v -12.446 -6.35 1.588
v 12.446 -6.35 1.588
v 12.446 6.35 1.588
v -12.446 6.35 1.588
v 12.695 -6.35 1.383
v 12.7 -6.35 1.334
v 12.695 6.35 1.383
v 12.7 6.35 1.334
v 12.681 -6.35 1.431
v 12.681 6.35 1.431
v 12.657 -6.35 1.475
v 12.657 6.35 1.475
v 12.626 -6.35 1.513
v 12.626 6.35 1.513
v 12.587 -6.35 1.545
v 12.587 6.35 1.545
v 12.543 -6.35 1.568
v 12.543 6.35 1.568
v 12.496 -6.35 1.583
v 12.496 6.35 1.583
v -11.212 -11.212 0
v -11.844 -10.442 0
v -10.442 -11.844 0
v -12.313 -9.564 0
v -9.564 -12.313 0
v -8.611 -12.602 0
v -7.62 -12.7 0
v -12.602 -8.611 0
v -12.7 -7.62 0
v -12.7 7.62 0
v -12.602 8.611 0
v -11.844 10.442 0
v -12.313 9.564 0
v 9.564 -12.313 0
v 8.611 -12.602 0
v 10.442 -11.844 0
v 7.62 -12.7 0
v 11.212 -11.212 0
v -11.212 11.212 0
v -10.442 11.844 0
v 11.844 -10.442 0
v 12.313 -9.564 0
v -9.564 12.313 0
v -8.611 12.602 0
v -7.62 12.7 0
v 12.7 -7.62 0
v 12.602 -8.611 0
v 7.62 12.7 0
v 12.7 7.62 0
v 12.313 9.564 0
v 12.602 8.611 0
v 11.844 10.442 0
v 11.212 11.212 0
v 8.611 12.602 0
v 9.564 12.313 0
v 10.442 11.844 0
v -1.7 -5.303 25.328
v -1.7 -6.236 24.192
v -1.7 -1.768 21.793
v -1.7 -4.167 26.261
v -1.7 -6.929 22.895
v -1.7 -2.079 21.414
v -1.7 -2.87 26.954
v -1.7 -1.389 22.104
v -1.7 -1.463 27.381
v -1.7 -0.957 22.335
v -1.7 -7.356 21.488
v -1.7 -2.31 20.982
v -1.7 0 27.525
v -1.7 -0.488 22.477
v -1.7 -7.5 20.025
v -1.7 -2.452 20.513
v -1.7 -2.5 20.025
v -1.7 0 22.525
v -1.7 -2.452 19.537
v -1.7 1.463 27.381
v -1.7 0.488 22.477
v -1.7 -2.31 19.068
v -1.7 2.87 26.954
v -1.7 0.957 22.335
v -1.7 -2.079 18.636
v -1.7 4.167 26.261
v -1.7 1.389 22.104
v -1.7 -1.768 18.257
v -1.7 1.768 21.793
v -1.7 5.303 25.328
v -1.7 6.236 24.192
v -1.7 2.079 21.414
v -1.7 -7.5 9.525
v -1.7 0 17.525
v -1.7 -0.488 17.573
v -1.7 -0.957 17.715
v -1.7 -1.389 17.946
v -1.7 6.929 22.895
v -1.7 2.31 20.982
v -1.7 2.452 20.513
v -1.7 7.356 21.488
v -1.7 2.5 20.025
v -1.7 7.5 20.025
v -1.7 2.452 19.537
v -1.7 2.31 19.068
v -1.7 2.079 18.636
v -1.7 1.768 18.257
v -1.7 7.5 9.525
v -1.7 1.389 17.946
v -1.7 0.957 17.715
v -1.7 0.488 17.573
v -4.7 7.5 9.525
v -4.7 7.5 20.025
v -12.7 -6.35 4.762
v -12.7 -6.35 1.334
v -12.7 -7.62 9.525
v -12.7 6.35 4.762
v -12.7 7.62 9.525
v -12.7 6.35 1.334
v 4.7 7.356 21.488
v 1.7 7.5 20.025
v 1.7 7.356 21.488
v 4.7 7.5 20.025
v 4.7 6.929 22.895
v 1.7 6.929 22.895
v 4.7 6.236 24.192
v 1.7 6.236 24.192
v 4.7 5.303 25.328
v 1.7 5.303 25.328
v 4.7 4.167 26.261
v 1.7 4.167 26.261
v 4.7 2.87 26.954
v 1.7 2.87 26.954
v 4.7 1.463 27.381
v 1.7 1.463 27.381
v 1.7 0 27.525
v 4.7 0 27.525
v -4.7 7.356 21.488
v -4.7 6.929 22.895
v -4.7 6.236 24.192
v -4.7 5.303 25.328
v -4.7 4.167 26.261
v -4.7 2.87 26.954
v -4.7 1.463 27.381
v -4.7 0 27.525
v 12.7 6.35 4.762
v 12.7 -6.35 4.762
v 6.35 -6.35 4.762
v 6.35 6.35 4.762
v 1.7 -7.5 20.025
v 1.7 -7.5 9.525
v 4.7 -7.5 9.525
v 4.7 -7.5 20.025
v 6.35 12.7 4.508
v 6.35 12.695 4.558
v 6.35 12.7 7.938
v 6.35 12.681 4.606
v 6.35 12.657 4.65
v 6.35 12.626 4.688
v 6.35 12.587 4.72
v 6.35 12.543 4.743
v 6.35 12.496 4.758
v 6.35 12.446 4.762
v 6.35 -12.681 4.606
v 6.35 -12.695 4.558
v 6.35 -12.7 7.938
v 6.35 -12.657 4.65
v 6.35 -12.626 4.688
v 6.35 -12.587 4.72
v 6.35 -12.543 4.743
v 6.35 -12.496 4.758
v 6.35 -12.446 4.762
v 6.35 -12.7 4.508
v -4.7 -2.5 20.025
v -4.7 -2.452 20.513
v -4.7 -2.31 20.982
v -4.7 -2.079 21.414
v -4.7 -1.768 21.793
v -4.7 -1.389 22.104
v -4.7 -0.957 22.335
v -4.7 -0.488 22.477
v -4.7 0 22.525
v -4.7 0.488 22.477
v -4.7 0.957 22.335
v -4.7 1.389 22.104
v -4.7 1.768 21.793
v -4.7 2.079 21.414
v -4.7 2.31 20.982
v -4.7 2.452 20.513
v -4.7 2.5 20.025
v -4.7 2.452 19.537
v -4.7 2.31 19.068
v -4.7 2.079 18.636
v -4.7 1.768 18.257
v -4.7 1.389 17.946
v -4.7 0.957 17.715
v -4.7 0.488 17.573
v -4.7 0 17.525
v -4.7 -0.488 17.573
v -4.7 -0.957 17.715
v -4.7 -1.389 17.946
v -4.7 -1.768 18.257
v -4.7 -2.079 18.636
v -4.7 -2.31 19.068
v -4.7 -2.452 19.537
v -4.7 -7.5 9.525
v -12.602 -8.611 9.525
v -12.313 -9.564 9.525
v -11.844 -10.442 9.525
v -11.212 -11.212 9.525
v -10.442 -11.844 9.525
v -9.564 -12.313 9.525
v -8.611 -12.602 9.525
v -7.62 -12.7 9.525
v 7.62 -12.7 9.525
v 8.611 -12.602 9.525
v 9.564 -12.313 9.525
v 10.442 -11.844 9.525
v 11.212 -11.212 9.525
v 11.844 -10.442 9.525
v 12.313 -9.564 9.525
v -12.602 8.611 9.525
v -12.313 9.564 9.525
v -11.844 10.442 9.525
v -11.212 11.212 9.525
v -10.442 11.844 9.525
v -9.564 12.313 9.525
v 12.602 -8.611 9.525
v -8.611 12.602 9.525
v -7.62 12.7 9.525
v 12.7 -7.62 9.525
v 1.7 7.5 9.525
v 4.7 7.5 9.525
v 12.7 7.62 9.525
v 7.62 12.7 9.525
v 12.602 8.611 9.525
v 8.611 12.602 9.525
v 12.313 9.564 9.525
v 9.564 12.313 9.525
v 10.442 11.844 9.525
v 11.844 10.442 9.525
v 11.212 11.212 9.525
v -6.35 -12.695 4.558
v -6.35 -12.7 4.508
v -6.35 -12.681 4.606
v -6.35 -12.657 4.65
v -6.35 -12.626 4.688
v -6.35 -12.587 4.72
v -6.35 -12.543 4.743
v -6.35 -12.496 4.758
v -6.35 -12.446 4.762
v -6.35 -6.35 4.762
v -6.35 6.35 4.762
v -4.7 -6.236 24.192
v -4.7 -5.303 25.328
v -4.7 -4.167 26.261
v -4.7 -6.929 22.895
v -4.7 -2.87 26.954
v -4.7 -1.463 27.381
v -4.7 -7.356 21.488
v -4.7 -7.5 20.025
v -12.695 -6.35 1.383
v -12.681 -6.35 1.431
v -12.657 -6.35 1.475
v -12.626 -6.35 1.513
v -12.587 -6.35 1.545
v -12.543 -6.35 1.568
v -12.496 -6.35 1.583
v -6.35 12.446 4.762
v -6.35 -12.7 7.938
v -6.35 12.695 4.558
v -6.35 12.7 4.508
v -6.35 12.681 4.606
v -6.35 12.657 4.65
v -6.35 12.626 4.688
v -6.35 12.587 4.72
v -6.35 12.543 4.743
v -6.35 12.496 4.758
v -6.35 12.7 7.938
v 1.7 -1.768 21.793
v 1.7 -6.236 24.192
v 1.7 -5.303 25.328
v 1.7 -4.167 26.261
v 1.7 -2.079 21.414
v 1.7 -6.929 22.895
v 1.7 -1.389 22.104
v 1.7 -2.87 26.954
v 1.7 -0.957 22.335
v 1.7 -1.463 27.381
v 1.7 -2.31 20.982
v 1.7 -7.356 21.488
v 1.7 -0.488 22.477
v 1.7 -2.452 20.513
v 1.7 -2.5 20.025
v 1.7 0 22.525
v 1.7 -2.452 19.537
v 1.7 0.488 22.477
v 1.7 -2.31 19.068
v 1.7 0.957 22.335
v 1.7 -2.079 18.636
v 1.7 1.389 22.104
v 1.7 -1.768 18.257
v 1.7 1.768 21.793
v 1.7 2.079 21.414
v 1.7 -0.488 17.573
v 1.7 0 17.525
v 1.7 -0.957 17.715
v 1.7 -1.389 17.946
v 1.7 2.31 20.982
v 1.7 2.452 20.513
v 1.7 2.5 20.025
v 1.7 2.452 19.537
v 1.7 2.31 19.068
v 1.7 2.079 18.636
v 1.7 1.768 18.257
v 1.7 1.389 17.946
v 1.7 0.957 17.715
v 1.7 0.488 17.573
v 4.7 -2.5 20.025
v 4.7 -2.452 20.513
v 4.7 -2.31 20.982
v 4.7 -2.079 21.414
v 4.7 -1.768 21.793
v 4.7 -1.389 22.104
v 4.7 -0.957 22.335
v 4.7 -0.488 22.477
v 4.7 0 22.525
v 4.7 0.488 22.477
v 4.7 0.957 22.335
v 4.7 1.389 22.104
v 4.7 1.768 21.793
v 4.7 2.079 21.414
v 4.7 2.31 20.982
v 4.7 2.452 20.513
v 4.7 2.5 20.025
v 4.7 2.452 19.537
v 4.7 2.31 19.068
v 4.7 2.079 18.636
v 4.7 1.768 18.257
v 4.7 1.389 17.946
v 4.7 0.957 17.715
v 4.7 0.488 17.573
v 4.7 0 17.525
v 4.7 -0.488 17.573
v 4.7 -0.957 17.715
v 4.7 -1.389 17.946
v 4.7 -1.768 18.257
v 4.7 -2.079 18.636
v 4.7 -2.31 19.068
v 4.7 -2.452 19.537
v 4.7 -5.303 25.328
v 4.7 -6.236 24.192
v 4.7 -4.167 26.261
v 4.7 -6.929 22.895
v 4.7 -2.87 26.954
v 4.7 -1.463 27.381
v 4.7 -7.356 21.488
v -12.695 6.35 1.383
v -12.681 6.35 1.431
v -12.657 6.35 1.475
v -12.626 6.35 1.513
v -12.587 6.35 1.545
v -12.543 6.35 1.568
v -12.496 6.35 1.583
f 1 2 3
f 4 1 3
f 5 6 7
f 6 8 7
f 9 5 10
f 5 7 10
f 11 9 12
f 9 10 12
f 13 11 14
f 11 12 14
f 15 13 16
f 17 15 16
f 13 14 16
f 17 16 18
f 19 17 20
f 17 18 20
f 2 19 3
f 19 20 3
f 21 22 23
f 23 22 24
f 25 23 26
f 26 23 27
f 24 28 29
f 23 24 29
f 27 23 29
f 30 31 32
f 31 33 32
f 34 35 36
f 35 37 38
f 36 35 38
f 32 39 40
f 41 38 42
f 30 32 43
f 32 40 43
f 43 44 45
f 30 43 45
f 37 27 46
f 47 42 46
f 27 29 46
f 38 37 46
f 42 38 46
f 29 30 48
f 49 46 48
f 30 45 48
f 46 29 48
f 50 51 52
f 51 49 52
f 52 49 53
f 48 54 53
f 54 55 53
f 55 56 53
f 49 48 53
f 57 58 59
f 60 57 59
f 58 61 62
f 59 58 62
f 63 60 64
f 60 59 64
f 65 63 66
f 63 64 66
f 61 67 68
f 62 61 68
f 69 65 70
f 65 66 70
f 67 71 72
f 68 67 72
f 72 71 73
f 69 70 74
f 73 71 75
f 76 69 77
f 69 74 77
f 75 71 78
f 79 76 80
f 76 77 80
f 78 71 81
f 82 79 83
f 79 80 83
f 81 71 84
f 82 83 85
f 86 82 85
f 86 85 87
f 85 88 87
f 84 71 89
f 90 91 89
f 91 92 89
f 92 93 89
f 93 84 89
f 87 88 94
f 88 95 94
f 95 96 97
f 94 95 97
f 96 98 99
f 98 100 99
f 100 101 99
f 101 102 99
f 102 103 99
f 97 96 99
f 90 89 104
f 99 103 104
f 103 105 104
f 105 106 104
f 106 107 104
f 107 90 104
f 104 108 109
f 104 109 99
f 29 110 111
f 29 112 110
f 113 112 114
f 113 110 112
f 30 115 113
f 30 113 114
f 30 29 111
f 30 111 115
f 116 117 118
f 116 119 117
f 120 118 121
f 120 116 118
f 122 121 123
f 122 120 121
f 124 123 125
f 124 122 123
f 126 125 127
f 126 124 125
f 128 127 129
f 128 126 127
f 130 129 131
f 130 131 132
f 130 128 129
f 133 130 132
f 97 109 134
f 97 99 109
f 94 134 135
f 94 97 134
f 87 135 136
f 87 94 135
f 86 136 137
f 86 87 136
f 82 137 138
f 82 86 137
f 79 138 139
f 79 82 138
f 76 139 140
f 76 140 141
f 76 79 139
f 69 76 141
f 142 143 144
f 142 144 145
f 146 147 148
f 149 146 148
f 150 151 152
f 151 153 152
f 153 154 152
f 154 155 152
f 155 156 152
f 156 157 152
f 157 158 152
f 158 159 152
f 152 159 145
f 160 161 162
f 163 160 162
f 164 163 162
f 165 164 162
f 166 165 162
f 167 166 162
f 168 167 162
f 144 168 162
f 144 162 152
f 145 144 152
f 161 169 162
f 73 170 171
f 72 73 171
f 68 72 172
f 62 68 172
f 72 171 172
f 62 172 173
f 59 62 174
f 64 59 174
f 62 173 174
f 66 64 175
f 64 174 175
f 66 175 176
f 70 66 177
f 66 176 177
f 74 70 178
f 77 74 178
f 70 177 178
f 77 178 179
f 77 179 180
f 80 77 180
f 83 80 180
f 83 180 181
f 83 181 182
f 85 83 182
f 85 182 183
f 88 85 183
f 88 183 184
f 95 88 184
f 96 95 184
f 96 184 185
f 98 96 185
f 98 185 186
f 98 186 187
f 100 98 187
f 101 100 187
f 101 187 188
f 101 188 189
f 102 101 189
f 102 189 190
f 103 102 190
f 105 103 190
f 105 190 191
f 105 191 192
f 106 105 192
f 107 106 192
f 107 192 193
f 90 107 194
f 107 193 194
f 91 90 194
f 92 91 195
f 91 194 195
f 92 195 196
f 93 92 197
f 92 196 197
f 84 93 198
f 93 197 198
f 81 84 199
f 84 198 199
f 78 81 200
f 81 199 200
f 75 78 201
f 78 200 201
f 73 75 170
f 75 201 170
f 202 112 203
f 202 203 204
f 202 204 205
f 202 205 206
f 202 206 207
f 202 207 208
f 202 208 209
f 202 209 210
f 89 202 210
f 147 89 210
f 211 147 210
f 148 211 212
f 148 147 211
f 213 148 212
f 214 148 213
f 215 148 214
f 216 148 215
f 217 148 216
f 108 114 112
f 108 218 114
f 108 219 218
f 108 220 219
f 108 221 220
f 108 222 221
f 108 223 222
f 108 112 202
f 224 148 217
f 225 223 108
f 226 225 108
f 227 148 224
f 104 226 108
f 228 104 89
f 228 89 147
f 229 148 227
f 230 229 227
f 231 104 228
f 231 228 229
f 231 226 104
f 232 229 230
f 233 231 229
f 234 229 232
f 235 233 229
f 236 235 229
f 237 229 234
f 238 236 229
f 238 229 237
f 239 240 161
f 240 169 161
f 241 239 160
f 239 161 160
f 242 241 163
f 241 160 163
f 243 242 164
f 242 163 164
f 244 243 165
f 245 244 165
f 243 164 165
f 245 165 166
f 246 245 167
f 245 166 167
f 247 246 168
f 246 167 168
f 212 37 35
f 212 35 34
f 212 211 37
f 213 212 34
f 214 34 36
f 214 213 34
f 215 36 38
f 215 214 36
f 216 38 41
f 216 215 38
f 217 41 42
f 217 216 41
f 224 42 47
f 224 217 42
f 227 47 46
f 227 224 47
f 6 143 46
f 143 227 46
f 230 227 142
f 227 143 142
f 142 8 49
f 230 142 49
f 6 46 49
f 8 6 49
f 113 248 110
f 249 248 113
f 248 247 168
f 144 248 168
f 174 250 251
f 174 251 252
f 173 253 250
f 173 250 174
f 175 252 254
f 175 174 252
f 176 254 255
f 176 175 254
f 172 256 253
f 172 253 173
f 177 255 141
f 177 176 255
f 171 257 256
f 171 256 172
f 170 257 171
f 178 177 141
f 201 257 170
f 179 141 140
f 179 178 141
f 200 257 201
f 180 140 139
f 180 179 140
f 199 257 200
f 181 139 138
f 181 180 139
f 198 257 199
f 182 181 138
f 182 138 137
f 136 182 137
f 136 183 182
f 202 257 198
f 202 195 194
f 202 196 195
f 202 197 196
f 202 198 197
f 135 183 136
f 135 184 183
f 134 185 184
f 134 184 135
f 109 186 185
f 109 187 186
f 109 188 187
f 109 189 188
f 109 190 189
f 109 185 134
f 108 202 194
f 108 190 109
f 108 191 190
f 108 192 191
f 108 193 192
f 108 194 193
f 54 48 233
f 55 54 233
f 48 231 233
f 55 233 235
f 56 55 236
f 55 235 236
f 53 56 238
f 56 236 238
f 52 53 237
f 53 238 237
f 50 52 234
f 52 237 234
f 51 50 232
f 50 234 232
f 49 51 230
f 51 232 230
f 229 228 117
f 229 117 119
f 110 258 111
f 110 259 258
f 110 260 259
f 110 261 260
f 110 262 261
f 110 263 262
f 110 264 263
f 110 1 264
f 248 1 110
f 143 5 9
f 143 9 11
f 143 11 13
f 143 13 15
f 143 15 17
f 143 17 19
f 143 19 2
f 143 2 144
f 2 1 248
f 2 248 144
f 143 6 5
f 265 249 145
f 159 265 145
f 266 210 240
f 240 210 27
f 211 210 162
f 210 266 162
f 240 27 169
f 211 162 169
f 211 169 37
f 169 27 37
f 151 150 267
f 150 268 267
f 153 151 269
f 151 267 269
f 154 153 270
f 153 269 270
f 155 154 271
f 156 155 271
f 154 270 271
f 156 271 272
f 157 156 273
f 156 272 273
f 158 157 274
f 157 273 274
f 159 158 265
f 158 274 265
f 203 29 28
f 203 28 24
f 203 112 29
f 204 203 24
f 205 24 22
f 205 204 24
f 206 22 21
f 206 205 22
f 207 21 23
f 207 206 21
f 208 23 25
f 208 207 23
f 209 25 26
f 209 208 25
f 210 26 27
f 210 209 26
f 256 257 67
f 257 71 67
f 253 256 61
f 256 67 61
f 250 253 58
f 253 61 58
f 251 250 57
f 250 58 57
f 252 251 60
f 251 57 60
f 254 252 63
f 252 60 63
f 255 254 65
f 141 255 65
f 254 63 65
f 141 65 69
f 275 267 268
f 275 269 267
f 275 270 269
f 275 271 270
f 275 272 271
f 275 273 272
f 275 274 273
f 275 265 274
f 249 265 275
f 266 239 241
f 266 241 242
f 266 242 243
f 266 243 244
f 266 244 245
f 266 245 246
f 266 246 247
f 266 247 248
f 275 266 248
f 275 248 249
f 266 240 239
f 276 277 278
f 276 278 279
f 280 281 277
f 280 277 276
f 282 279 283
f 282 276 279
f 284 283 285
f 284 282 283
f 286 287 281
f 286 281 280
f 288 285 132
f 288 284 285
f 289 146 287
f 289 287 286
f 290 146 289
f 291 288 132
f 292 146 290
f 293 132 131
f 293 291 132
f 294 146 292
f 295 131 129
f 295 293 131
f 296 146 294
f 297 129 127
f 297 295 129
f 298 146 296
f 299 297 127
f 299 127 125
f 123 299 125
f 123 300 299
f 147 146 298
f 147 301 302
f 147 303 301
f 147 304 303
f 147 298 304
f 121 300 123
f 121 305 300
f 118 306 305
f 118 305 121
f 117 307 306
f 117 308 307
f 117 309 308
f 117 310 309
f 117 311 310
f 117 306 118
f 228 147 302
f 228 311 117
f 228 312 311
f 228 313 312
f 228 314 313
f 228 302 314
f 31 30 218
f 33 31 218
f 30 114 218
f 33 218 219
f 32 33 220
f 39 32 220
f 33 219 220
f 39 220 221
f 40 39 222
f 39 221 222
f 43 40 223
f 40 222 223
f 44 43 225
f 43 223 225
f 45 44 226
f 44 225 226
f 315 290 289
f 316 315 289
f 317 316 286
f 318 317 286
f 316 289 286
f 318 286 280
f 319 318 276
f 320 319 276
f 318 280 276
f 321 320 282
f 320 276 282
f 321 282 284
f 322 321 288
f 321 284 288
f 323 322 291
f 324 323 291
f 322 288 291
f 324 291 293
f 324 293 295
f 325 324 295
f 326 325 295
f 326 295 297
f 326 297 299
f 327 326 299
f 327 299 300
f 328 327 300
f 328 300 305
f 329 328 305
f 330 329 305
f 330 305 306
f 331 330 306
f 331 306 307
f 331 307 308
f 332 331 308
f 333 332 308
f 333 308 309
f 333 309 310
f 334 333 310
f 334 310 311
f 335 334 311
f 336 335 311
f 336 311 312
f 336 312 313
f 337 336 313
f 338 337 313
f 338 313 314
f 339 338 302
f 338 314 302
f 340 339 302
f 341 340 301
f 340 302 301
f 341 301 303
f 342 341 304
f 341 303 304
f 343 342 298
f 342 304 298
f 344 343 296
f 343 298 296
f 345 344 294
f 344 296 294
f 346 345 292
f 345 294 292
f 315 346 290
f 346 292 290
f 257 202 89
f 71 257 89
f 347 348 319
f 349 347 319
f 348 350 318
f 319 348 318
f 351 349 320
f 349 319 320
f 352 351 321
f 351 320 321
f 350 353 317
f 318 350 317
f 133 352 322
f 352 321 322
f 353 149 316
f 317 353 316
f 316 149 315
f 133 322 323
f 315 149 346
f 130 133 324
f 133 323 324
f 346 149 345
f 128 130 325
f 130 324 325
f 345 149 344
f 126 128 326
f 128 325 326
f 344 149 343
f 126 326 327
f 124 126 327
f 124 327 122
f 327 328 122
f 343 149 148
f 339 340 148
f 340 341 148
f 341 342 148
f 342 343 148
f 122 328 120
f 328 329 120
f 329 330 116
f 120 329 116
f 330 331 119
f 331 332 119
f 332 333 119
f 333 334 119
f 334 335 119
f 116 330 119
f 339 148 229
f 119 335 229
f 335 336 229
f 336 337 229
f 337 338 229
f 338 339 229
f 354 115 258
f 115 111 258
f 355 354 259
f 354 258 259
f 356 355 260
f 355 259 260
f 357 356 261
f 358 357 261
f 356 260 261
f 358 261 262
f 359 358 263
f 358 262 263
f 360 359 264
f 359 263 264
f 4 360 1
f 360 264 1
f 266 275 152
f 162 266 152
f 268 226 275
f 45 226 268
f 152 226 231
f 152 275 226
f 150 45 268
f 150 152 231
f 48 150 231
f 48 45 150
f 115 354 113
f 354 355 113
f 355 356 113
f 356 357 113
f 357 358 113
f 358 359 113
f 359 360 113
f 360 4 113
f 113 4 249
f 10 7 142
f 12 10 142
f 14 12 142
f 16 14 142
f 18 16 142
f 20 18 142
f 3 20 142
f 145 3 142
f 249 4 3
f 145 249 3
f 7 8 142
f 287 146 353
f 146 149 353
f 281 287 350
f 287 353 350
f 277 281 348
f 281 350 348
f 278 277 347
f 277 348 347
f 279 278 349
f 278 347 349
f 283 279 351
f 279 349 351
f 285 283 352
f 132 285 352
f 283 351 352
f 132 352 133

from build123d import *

# Parameters (mm, degrees)
F0_W     = 25.4
F0_H     = 25.4
F1_DEPTH = 9.525
F2_W     = 3
F2_H     = 15
F3_DEPTH = 18
F4_R     = 7.49999
F5_W     = 12.7
F5_H     = 3.175
F6_DEPTH = 25.401
F7_W     = 12.7
F7_H     = 3.175
F8_DEPTH = 25.401
F10_D    = 5
F11_R    = 5.08
F12_R    = 0.254


# Not quite as in the source:
# - a fillet or chamfer is up to 0.001 mm smaller than in the source, because OpenCascade refuses the exact size


with BuildPart() as f1:
    # F0 (on Top) → F1 (new body)
    with BuildSketch(Plane.XY):
        Rectangle(F0_W, F0_H)
    extrude(amount=F1_DEPTH)

    # F2 (on face) → F3 (join)
    with BuildSketch(Plane.XY.offset(9.525)):
        with Locations((-3.2, 0)):
            Rectangle(F2_W, F2_H)
        with Locations((3.2, 0)):
            Rectangle(F2_W, F2_H)
    extrude(amount=F3_DEPTH)

    # F4 (radius 7.5 in the source; OpenCascade refuses exactly that, so slightly less here)
    f4_edges = [f1.edges().sort_by_distance(p)[0] for p in [
        (3.2, 7.5, 27.525),
        (3.2, -7.5, 27.525),
        (-3.2, 7.5, 27.525),
        (-3.2, -7.5, 27.525),
    ]]
    fillet(f4_edges, radius=F4_R)

    # F5 (on face) → F6 (cut, through all)
    with BuildSketch(Plane.YZ.offset(12.7)):
        with Locations((0, 3.175)):
            Rectangle(F5_W, F5_H)
    extrude(amount=-F6_DEPTH, mode=Mode.SUBTRACT)

    # F7 (on face) → F8 (cut, through all)
    with BuildSketch(Plane.XZ.offset(12.7)):
        with Locations((0, 6.35)):
            Rectangle(F7_W, F7_H)
    extrude(amount=-F8_DEPTH, mode=Mode.SUBTRACT)

    # F10 (through all)
    with Locations(Plane.YZ.offset(4.7)):
        with Locations((0, 20.025)):
            Hole(F10_D / 2)

    # F11
    f11_edges = [f1.edges().sort_by_distance(p)[0] for p in [
        (12.7, -12.7, 4.7625),
        (-12.7, -12.7, 4.7625),
        (12.7, 12.7, 4.7625),
        (-12.7, 12.7, 4.7625),
    ]]
    fillet(f11_edges, radius=F11_R)

    # F12
    f12_edges = [f1.edges().sort_by_distance(p)[0] for p in [
        (0, -12.7, 4.7625),
        (12.7, 0, 1.5875),
        (0, 12.7, 4.7625),
        (-12.7, 0, 1.5875),
    ]]
    fillet(f12_edges, radius=F12_R)


solid = f1.part
